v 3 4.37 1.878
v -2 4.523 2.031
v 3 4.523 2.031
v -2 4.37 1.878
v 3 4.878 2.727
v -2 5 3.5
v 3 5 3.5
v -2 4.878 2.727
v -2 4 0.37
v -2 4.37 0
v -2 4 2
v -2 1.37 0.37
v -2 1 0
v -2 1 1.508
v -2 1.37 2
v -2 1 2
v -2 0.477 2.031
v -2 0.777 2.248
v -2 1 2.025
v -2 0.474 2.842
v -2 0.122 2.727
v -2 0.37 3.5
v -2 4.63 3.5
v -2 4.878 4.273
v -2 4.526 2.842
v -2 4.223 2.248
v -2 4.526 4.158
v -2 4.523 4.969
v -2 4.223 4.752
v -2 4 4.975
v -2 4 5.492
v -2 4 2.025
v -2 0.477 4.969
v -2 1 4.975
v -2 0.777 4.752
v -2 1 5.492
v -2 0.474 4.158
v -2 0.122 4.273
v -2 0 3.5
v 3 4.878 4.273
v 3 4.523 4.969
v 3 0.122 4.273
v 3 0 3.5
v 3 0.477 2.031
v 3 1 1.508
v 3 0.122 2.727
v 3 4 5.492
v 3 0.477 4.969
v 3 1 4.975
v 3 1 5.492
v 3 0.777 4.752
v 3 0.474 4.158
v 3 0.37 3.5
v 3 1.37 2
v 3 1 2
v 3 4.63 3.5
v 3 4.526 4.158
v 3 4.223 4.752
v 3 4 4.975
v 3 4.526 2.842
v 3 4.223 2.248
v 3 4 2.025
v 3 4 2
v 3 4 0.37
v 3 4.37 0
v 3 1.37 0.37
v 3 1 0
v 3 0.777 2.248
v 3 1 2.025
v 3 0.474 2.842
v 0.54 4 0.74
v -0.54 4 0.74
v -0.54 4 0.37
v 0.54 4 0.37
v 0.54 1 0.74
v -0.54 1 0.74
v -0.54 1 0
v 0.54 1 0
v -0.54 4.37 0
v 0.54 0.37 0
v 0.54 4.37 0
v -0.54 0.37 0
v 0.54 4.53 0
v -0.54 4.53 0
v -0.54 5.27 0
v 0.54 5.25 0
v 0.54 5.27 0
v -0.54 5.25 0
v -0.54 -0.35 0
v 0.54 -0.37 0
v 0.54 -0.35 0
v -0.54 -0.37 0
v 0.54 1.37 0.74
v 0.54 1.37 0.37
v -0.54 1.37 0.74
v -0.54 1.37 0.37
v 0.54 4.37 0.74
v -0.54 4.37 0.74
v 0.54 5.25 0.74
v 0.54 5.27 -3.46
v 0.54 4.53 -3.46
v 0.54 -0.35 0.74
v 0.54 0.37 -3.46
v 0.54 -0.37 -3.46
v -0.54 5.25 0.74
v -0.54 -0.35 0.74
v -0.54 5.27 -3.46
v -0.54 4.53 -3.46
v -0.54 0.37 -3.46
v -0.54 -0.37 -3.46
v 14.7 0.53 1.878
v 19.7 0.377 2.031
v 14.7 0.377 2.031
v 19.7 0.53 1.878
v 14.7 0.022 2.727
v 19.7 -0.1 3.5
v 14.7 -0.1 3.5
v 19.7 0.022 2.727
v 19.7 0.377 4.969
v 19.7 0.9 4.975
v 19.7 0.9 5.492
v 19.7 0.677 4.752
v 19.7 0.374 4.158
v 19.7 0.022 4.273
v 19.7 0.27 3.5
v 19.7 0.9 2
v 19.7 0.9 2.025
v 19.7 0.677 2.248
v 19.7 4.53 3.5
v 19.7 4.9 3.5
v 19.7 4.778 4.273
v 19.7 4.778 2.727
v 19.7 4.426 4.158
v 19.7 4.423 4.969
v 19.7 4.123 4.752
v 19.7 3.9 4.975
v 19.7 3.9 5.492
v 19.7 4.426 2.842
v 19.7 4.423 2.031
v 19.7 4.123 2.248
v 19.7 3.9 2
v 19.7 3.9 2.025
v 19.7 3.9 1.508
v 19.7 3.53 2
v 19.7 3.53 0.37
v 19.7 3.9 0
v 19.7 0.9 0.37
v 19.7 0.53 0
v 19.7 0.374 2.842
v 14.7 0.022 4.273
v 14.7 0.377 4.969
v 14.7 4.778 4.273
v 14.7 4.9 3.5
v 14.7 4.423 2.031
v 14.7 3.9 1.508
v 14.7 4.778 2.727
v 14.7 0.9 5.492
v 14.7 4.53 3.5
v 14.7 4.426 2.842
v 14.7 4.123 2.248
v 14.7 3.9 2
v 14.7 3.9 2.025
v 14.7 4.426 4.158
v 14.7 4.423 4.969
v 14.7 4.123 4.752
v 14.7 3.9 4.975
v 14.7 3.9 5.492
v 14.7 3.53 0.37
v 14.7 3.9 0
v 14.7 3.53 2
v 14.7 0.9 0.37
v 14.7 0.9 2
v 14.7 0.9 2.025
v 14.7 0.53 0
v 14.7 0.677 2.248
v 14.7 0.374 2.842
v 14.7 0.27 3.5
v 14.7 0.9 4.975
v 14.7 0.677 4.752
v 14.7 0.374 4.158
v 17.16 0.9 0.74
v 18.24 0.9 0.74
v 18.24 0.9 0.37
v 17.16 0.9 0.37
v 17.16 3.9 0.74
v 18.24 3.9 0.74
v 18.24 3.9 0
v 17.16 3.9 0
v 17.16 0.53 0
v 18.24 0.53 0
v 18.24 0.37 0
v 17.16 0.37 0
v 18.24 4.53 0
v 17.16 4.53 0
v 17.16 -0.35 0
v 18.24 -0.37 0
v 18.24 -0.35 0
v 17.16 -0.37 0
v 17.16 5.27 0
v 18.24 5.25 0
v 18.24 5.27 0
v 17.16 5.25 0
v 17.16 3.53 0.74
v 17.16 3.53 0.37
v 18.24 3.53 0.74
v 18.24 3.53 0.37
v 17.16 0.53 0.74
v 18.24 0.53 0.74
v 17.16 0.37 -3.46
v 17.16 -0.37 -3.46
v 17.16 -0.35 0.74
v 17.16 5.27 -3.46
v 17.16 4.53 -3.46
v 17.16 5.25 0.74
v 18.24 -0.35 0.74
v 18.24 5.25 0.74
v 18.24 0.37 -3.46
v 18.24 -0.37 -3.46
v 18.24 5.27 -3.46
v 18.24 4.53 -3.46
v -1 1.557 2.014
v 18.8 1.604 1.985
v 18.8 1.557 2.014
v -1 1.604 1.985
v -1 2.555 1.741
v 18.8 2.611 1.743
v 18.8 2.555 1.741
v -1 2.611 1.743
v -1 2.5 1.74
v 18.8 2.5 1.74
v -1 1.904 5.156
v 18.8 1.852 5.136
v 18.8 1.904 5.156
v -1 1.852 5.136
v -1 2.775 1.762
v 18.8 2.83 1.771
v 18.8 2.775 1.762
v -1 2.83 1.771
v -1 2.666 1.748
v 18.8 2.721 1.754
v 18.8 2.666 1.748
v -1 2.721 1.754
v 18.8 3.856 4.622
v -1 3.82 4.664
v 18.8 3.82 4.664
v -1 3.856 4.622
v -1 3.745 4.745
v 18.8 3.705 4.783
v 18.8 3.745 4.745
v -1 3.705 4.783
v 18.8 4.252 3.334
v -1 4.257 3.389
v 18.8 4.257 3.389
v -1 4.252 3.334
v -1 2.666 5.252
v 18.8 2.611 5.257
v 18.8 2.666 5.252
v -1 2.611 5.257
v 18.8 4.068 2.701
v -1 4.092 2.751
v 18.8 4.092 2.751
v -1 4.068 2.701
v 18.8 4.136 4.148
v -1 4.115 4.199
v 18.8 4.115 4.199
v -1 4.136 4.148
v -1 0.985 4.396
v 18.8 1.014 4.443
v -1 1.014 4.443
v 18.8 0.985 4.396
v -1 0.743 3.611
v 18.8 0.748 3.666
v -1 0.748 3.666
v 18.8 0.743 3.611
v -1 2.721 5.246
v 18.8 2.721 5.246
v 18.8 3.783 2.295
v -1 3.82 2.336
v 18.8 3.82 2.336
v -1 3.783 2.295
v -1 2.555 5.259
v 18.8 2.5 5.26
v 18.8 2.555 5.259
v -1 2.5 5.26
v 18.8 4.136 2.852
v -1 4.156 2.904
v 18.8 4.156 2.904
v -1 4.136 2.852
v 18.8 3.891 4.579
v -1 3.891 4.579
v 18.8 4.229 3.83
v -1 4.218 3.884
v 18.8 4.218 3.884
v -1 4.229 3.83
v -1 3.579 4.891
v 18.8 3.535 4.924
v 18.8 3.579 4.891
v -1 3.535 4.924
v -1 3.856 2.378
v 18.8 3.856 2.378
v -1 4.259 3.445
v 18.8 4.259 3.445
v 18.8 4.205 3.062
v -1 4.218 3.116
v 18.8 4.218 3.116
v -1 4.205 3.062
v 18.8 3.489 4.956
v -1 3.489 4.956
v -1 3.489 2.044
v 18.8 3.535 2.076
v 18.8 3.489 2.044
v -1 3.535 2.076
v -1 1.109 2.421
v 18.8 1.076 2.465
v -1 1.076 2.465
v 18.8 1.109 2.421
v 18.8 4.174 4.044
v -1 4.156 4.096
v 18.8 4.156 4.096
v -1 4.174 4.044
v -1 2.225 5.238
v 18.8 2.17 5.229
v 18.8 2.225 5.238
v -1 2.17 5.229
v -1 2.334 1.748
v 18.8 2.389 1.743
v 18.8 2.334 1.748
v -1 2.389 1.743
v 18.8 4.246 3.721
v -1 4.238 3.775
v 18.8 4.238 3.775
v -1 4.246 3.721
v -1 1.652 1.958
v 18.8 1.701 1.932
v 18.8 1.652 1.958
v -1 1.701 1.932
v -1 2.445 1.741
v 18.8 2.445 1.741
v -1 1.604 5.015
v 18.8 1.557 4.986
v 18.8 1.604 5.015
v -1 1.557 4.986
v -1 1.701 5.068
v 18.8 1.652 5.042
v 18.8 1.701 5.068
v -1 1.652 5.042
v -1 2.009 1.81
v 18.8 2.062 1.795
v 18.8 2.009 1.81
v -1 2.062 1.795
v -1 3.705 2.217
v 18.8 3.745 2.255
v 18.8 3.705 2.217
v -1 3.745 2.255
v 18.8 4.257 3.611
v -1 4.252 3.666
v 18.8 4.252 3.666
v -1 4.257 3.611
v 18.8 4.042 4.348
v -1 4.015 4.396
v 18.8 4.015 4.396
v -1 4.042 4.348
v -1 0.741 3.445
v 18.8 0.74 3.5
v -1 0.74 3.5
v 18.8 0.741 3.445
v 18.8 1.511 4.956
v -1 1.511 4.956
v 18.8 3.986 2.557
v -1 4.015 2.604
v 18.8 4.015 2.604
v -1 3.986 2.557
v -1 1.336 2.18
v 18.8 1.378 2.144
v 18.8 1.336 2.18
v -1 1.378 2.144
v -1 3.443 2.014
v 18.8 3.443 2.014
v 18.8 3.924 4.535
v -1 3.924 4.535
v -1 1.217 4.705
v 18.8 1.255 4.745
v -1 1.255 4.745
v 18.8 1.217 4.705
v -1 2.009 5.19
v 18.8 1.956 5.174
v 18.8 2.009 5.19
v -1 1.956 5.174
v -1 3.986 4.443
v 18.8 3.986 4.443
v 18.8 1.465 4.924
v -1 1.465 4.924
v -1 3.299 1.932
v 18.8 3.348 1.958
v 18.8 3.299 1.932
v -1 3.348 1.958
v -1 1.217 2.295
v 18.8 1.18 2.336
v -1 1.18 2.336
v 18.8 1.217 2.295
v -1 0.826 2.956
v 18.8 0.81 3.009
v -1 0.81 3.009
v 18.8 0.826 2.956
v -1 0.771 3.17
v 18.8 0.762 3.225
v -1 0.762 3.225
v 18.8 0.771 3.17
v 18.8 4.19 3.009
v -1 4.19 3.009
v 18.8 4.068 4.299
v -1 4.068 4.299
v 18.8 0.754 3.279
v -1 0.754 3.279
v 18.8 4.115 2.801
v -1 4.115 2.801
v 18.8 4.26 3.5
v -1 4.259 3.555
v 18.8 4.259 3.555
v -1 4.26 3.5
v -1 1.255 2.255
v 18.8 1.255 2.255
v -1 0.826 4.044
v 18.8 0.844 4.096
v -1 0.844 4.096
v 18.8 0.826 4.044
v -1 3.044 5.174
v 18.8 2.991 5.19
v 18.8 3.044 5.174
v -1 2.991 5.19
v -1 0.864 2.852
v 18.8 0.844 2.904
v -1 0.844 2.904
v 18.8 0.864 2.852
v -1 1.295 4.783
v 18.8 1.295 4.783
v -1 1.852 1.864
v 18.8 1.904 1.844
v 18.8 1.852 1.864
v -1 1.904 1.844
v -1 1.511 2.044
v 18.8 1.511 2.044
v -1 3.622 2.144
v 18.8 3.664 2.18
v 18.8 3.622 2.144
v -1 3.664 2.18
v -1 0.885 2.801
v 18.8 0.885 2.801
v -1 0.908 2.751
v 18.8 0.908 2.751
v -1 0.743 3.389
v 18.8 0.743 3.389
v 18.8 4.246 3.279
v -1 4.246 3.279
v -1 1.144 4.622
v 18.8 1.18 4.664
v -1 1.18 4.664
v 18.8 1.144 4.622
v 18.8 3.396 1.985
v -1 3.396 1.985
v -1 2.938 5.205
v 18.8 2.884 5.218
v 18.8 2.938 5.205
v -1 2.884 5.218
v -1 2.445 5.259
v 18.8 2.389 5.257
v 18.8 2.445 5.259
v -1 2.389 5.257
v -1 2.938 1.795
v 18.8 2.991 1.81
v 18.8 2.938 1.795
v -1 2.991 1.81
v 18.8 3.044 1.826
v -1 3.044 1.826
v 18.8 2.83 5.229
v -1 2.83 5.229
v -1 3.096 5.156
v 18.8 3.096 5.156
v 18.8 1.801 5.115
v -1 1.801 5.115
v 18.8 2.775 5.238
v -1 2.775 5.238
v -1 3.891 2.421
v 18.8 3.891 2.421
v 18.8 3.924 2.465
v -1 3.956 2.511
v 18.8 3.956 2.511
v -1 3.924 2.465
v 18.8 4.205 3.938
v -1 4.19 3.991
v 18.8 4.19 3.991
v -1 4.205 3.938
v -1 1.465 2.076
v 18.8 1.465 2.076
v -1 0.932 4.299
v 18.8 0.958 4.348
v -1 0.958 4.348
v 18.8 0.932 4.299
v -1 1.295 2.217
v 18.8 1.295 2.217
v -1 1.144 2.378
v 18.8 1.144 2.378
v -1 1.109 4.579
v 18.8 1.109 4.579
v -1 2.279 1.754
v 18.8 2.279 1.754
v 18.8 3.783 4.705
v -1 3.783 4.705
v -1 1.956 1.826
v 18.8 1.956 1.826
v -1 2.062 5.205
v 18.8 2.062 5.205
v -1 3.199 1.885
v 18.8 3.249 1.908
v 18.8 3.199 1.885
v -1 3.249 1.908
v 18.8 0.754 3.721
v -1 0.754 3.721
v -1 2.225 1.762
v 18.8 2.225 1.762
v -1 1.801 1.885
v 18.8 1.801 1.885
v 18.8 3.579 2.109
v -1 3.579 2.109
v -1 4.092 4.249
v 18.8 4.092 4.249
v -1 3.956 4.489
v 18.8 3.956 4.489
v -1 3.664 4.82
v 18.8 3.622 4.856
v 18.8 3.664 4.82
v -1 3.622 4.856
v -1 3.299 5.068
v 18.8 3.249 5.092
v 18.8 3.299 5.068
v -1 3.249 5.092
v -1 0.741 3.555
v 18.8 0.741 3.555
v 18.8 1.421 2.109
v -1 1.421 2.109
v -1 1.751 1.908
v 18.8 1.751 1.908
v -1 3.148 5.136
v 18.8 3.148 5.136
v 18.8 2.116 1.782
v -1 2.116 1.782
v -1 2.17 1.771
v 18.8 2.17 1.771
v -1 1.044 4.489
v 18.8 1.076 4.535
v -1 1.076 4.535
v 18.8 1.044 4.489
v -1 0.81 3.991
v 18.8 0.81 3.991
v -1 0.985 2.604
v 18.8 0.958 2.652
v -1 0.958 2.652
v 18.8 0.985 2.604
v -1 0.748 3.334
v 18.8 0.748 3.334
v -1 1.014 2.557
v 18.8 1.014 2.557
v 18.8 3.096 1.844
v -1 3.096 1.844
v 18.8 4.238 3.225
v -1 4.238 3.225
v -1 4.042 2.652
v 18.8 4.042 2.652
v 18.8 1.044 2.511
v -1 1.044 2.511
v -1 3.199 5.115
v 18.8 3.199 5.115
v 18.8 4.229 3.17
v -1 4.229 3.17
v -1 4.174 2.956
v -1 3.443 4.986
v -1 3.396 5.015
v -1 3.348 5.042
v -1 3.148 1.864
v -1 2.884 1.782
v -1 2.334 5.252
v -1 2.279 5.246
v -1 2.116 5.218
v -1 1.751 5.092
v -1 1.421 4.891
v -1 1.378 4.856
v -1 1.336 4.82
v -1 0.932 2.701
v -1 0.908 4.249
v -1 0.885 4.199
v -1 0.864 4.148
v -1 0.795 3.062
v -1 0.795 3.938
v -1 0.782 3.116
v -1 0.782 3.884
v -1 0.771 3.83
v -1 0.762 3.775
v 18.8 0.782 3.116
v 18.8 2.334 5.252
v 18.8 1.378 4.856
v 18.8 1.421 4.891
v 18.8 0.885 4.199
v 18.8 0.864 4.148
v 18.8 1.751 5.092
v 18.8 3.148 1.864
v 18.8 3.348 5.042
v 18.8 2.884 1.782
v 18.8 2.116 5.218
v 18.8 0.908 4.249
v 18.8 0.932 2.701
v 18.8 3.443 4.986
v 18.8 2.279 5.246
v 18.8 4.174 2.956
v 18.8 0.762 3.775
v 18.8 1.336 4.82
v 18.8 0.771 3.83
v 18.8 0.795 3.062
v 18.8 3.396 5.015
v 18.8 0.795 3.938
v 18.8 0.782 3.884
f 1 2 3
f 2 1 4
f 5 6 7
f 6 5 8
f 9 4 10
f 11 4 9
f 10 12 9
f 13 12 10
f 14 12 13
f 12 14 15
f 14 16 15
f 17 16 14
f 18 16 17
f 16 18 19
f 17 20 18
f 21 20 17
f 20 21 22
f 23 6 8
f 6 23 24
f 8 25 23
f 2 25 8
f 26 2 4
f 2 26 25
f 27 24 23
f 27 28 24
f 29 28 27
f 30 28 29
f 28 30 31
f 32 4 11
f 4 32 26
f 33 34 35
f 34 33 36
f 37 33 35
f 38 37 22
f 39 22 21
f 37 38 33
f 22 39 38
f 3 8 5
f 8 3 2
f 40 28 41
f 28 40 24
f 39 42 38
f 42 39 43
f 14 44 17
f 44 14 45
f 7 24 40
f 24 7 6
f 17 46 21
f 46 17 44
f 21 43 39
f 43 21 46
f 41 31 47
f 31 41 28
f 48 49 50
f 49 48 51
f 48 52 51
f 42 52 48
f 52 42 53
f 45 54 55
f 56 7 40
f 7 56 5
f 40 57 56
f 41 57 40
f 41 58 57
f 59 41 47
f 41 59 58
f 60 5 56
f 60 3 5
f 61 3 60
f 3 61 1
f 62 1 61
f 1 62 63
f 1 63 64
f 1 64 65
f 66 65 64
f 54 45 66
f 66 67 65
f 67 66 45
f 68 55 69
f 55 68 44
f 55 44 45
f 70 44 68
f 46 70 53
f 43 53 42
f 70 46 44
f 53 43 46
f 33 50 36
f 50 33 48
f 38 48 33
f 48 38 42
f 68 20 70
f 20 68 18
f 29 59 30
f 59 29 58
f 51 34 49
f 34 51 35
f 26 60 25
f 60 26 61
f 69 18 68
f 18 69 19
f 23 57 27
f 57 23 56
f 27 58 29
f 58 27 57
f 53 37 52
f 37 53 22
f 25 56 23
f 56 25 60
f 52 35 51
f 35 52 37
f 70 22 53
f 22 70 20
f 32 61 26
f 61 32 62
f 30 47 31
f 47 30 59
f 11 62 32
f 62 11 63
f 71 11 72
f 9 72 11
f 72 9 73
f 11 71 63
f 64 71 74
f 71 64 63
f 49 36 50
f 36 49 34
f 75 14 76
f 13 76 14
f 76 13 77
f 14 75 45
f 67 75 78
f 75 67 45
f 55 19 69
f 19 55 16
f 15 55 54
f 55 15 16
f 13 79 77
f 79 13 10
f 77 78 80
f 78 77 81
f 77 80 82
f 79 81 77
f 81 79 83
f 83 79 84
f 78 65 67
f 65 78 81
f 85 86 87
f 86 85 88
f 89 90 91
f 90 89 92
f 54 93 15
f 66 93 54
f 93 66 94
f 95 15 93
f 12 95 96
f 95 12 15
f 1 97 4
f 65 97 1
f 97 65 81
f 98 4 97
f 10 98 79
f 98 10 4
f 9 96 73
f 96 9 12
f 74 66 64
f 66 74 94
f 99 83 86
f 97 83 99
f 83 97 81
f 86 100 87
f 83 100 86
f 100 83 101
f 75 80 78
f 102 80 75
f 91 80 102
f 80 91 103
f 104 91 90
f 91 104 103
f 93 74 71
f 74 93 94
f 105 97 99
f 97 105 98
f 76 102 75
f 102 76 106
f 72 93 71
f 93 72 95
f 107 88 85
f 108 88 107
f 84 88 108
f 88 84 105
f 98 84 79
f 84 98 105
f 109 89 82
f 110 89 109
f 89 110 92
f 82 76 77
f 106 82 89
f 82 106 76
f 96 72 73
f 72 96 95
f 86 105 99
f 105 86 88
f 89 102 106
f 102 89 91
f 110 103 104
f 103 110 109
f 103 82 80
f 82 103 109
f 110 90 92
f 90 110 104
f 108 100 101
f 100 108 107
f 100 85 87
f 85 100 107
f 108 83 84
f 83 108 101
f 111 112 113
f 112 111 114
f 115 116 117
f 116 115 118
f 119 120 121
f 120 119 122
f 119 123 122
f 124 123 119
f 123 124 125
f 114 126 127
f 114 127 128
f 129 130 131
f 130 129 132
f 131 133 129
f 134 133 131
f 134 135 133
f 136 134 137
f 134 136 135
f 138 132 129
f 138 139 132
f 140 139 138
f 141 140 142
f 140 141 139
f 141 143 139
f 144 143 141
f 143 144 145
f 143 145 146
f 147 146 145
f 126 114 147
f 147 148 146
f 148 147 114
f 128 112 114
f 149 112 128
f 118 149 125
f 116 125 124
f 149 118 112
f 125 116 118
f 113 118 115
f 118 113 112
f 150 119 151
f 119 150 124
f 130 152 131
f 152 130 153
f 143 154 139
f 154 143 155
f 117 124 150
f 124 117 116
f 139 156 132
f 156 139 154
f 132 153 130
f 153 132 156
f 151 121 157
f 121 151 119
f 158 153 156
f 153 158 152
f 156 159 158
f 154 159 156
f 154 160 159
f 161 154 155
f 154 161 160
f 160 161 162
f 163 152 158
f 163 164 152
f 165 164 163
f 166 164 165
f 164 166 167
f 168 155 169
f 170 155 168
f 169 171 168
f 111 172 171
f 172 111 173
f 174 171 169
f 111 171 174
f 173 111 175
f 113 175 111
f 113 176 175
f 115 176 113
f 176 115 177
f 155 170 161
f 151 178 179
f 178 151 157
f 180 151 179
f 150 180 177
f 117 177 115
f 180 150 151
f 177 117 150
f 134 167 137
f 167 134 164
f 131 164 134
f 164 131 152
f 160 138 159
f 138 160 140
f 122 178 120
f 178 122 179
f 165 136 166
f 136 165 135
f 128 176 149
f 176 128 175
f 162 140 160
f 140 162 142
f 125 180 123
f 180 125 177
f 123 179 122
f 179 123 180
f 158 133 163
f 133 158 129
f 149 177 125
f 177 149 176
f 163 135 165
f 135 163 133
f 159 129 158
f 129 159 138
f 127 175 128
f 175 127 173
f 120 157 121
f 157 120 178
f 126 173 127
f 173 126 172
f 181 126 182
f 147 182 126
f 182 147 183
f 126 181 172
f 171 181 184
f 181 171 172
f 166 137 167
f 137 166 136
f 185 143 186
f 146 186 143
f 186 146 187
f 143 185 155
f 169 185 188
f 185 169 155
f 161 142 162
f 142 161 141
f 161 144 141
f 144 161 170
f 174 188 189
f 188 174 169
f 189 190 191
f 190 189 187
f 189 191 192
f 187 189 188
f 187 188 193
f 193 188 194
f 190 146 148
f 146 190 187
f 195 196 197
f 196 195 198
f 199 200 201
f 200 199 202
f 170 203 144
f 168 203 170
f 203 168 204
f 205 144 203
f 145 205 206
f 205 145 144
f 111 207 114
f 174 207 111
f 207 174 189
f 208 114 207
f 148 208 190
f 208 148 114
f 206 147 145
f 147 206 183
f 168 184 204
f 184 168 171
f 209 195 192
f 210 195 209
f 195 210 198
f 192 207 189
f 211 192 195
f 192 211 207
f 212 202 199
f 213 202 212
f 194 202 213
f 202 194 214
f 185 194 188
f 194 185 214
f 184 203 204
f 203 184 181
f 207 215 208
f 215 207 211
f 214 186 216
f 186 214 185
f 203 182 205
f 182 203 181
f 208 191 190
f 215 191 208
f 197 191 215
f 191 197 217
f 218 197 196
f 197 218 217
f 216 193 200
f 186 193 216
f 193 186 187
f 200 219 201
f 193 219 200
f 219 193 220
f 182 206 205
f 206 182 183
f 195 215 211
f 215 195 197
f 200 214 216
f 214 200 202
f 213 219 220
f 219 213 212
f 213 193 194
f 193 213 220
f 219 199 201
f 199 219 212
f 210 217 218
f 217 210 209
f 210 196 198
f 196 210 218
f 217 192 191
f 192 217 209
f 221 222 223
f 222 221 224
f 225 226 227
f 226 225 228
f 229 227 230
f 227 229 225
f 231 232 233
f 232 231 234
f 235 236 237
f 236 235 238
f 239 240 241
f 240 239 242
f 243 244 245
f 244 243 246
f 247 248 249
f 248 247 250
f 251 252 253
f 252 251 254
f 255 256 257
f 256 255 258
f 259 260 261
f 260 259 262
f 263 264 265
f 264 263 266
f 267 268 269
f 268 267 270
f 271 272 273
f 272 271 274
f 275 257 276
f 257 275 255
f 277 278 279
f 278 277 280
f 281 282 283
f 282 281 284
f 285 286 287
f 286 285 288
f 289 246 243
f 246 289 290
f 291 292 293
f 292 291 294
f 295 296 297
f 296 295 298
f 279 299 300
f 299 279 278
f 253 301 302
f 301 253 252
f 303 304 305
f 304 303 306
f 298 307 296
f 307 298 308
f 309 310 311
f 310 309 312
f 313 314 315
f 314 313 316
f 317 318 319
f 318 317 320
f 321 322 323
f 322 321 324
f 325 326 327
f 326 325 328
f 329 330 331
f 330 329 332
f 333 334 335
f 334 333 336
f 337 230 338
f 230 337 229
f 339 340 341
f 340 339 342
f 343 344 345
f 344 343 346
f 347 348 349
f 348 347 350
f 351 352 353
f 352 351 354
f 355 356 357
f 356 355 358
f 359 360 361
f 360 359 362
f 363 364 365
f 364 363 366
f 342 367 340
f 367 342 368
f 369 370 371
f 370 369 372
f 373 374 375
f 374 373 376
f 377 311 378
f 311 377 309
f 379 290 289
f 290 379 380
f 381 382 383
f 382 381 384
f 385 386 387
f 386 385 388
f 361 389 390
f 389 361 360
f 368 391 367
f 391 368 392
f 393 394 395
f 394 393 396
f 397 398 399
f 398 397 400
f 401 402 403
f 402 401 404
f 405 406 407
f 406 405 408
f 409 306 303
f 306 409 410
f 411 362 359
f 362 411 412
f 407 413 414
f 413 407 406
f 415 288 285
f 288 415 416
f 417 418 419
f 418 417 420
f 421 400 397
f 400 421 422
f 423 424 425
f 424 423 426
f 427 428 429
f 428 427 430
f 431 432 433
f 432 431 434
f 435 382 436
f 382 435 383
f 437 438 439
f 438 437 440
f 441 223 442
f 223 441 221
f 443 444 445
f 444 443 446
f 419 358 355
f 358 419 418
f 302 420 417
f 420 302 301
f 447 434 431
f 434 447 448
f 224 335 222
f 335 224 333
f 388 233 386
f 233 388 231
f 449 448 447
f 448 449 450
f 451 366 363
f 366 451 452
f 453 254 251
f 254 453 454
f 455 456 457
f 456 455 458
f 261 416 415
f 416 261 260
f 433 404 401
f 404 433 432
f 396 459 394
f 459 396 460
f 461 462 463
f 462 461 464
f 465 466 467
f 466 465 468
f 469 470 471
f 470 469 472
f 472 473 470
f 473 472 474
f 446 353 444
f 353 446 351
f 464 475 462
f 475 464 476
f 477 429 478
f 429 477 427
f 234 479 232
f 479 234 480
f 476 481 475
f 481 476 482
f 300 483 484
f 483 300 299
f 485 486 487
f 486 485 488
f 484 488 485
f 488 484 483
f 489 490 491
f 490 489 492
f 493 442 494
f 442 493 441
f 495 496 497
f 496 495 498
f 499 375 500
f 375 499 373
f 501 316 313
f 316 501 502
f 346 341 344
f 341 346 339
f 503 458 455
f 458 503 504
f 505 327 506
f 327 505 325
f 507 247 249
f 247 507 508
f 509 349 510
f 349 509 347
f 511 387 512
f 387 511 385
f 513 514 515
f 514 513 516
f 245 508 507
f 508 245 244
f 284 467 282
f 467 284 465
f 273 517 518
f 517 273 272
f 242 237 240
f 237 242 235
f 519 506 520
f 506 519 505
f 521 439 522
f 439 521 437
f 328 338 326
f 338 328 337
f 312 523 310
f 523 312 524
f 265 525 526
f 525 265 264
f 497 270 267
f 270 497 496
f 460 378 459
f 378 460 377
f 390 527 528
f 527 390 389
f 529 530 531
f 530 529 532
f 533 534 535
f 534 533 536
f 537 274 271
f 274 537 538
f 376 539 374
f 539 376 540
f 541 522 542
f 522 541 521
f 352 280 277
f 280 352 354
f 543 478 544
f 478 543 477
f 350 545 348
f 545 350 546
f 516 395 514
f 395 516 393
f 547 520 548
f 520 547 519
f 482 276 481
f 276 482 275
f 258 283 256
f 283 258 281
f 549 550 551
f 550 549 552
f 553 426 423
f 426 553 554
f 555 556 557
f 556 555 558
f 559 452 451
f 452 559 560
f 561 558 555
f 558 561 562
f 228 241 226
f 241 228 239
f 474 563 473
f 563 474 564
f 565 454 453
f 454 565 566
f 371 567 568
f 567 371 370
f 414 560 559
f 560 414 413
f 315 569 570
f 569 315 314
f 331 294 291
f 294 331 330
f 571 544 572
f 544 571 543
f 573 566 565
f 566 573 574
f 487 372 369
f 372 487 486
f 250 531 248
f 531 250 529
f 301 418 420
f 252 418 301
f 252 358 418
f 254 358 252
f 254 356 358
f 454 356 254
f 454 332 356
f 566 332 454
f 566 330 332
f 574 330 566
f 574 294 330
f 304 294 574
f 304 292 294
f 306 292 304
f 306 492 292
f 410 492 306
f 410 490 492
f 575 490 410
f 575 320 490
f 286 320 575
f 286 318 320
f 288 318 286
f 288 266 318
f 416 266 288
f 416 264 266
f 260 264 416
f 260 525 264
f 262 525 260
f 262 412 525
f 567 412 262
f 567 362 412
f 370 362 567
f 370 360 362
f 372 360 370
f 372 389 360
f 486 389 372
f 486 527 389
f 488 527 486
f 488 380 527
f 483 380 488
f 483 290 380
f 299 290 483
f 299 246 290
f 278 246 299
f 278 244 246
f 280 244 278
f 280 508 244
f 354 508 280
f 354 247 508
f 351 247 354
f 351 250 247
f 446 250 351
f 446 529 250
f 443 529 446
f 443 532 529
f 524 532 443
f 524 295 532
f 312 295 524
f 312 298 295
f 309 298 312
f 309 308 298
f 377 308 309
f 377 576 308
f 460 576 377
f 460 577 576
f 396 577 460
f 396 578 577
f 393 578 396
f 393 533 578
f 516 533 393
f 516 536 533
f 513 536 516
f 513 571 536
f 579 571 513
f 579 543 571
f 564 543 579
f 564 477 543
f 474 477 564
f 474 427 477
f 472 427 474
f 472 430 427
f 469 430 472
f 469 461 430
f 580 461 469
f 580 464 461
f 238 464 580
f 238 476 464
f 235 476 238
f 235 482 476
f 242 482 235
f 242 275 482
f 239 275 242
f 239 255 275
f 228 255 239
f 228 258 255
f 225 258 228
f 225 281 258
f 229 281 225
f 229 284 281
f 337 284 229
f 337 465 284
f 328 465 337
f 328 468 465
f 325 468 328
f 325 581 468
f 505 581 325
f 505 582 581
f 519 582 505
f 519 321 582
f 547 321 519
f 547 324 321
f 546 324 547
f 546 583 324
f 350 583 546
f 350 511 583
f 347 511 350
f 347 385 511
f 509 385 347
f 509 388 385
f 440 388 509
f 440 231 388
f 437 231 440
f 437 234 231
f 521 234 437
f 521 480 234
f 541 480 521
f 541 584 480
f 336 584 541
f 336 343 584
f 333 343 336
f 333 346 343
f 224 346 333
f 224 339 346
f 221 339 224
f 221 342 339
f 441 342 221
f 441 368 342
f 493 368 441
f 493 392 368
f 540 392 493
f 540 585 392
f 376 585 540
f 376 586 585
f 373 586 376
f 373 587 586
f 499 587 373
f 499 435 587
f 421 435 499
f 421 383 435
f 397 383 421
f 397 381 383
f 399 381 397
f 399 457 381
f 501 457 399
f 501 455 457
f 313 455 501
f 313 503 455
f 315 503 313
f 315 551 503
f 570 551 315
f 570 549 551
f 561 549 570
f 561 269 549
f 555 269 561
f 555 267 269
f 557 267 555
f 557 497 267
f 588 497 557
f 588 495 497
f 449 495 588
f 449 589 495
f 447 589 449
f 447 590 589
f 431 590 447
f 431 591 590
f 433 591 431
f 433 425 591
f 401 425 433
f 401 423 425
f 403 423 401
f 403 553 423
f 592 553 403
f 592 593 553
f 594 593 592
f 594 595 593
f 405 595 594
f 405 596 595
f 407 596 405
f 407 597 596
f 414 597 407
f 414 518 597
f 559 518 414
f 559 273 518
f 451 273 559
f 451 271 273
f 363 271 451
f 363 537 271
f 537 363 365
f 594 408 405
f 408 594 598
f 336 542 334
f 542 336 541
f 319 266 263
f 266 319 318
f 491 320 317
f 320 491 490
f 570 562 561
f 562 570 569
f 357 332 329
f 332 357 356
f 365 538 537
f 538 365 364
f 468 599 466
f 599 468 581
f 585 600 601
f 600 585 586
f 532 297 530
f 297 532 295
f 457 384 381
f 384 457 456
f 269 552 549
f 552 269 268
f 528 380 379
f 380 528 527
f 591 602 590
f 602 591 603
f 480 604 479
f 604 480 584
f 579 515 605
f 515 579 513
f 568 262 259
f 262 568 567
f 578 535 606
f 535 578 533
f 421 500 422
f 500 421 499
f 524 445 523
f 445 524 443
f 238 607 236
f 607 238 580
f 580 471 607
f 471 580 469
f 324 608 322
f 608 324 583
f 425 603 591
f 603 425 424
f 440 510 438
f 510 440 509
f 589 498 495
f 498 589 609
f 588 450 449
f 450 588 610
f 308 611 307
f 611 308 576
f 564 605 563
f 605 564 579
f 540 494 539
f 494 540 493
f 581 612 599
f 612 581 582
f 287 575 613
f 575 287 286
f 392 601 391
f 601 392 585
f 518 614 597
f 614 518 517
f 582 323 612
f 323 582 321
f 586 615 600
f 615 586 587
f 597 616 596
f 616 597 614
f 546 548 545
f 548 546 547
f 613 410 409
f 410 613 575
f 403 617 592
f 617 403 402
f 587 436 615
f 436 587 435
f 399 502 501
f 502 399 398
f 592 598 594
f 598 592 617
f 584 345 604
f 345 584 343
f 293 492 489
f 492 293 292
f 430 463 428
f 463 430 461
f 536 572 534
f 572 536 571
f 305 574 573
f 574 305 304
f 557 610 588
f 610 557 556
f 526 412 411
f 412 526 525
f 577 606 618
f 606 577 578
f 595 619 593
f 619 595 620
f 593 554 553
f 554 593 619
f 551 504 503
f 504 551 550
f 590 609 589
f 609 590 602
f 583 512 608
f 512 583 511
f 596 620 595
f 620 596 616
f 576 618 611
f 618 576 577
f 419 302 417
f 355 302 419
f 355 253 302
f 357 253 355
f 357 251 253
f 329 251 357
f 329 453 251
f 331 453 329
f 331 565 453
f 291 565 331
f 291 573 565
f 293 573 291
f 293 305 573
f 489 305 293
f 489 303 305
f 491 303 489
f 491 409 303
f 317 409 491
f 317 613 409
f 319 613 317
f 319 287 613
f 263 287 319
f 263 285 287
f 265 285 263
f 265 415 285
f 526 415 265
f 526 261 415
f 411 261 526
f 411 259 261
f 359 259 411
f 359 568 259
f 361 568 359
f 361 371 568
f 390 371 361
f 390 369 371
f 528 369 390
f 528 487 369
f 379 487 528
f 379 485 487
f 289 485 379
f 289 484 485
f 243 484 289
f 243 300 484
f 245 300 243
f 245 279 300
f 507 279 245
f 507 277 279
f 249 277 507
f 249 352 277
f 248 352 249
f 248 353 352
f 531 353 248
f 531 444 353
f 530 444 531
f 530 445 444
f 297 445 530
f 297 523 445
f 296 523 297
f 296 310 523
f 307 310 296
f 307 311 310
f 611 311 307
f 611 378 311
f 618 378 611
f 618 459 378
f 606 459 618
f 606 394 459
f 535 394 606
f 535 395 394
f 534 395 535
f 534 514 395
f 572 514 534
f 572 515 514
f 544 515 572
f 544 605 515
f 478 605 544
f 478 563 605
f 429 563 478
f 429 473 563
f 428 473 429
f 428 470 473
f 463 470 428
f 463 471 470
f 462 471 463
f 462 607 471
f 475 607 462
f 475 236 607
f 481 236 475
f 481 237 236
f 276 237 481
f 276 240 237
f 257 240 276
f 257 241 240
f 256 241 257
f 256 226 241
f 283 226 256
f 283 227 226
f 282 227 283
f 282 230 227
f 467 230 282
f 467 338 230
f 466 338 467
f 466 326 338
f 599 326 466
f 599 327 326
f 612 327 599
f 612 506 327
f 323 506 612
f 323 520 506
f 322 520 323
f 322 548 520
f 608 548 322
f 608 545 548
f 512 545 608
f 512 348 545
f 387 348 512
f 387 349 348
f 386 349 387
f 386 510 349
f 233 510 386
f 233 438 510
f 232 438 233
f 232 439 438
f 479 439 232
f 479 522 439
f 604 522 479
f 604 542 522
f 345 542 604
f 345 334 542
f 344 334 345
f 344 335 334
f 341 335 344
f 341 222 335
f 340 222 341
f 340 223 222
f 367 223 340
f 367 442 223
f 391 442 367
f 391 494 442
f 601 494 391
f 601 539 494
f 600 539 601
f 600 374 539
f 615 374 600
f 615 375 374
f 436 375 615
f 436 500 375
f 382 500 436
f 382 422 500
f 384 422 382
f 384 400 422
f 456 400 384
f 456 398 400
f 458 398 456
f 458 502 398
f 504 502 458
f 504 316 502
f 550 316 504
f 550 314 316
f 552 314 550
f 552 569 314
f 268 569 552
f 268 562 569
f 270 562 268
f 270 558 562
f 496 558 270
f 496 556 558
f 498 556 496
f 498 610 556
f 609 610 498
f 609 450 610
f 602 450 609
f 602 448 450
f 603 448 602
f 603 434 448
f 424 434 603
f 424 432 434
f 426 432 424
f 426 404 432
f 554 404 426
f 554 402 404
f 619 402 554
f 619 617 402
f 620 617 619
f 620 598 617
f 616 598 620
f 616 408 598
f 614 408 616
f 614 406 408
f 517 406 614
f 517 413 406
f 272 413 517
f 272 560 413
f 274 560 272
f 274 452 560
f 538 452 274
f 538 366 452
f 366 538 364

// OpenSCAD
aDim=5;

t=0.74; // thickness of the metal in mm

module fuse_holder() {
    translate([-2,aDim/2,3.5]) rotate([0,90,0]) 
    difference(){
        cylinder(r=aDim/2, h=5,$fn=20);
        translate([0,0,-0.01]) cylinder(r=aDim/2-t/2, h=5.02,$fn=20);
        translate([-aDim/2,-1.5, -0.01]) cube([aDim, 3, 5.02], center=false);
    }
    
    
    translate([-2,1,0])cube([5,t/2,2]);
    translate([-2,4,0])cube([5,t/2,2]);
    translate([-2,1,0])cube([5,3.35,t/2]);


    // the pins
    pl=3.46;
    translate([0,2.45,t/2])cube([1.08, 5.6,t],center=true);
    
    translate([0,0,-pl/2])cube([1.08,t,pl],center=true);
    translate([0,4.9,-pl/2])cube([1.08,t,pl],center=true);
}

module fuse() {
cylinder(r=aDim/2-t,h=5, $fn=200);
color("white")translate([0,0,5])cylinder(r=aDim/2-t,h=9.80, $fn=200);
translate([0,0,14.80])cylinder(r=aDim/2-t,h=5, $fn=200);
}

module fuse_with_holder() {
    group(){
    // display two holder pins
    fuse_holder();
    translate([17.7,4.9,0])rotate([0,0,180])fuse_holder();

    // draw a fuse
    translate([-1,2.5,3.5])rotate([0,90,0])fuse();
    }
}

//fuse_holder();
//fuse();
fuse_with_holder();
